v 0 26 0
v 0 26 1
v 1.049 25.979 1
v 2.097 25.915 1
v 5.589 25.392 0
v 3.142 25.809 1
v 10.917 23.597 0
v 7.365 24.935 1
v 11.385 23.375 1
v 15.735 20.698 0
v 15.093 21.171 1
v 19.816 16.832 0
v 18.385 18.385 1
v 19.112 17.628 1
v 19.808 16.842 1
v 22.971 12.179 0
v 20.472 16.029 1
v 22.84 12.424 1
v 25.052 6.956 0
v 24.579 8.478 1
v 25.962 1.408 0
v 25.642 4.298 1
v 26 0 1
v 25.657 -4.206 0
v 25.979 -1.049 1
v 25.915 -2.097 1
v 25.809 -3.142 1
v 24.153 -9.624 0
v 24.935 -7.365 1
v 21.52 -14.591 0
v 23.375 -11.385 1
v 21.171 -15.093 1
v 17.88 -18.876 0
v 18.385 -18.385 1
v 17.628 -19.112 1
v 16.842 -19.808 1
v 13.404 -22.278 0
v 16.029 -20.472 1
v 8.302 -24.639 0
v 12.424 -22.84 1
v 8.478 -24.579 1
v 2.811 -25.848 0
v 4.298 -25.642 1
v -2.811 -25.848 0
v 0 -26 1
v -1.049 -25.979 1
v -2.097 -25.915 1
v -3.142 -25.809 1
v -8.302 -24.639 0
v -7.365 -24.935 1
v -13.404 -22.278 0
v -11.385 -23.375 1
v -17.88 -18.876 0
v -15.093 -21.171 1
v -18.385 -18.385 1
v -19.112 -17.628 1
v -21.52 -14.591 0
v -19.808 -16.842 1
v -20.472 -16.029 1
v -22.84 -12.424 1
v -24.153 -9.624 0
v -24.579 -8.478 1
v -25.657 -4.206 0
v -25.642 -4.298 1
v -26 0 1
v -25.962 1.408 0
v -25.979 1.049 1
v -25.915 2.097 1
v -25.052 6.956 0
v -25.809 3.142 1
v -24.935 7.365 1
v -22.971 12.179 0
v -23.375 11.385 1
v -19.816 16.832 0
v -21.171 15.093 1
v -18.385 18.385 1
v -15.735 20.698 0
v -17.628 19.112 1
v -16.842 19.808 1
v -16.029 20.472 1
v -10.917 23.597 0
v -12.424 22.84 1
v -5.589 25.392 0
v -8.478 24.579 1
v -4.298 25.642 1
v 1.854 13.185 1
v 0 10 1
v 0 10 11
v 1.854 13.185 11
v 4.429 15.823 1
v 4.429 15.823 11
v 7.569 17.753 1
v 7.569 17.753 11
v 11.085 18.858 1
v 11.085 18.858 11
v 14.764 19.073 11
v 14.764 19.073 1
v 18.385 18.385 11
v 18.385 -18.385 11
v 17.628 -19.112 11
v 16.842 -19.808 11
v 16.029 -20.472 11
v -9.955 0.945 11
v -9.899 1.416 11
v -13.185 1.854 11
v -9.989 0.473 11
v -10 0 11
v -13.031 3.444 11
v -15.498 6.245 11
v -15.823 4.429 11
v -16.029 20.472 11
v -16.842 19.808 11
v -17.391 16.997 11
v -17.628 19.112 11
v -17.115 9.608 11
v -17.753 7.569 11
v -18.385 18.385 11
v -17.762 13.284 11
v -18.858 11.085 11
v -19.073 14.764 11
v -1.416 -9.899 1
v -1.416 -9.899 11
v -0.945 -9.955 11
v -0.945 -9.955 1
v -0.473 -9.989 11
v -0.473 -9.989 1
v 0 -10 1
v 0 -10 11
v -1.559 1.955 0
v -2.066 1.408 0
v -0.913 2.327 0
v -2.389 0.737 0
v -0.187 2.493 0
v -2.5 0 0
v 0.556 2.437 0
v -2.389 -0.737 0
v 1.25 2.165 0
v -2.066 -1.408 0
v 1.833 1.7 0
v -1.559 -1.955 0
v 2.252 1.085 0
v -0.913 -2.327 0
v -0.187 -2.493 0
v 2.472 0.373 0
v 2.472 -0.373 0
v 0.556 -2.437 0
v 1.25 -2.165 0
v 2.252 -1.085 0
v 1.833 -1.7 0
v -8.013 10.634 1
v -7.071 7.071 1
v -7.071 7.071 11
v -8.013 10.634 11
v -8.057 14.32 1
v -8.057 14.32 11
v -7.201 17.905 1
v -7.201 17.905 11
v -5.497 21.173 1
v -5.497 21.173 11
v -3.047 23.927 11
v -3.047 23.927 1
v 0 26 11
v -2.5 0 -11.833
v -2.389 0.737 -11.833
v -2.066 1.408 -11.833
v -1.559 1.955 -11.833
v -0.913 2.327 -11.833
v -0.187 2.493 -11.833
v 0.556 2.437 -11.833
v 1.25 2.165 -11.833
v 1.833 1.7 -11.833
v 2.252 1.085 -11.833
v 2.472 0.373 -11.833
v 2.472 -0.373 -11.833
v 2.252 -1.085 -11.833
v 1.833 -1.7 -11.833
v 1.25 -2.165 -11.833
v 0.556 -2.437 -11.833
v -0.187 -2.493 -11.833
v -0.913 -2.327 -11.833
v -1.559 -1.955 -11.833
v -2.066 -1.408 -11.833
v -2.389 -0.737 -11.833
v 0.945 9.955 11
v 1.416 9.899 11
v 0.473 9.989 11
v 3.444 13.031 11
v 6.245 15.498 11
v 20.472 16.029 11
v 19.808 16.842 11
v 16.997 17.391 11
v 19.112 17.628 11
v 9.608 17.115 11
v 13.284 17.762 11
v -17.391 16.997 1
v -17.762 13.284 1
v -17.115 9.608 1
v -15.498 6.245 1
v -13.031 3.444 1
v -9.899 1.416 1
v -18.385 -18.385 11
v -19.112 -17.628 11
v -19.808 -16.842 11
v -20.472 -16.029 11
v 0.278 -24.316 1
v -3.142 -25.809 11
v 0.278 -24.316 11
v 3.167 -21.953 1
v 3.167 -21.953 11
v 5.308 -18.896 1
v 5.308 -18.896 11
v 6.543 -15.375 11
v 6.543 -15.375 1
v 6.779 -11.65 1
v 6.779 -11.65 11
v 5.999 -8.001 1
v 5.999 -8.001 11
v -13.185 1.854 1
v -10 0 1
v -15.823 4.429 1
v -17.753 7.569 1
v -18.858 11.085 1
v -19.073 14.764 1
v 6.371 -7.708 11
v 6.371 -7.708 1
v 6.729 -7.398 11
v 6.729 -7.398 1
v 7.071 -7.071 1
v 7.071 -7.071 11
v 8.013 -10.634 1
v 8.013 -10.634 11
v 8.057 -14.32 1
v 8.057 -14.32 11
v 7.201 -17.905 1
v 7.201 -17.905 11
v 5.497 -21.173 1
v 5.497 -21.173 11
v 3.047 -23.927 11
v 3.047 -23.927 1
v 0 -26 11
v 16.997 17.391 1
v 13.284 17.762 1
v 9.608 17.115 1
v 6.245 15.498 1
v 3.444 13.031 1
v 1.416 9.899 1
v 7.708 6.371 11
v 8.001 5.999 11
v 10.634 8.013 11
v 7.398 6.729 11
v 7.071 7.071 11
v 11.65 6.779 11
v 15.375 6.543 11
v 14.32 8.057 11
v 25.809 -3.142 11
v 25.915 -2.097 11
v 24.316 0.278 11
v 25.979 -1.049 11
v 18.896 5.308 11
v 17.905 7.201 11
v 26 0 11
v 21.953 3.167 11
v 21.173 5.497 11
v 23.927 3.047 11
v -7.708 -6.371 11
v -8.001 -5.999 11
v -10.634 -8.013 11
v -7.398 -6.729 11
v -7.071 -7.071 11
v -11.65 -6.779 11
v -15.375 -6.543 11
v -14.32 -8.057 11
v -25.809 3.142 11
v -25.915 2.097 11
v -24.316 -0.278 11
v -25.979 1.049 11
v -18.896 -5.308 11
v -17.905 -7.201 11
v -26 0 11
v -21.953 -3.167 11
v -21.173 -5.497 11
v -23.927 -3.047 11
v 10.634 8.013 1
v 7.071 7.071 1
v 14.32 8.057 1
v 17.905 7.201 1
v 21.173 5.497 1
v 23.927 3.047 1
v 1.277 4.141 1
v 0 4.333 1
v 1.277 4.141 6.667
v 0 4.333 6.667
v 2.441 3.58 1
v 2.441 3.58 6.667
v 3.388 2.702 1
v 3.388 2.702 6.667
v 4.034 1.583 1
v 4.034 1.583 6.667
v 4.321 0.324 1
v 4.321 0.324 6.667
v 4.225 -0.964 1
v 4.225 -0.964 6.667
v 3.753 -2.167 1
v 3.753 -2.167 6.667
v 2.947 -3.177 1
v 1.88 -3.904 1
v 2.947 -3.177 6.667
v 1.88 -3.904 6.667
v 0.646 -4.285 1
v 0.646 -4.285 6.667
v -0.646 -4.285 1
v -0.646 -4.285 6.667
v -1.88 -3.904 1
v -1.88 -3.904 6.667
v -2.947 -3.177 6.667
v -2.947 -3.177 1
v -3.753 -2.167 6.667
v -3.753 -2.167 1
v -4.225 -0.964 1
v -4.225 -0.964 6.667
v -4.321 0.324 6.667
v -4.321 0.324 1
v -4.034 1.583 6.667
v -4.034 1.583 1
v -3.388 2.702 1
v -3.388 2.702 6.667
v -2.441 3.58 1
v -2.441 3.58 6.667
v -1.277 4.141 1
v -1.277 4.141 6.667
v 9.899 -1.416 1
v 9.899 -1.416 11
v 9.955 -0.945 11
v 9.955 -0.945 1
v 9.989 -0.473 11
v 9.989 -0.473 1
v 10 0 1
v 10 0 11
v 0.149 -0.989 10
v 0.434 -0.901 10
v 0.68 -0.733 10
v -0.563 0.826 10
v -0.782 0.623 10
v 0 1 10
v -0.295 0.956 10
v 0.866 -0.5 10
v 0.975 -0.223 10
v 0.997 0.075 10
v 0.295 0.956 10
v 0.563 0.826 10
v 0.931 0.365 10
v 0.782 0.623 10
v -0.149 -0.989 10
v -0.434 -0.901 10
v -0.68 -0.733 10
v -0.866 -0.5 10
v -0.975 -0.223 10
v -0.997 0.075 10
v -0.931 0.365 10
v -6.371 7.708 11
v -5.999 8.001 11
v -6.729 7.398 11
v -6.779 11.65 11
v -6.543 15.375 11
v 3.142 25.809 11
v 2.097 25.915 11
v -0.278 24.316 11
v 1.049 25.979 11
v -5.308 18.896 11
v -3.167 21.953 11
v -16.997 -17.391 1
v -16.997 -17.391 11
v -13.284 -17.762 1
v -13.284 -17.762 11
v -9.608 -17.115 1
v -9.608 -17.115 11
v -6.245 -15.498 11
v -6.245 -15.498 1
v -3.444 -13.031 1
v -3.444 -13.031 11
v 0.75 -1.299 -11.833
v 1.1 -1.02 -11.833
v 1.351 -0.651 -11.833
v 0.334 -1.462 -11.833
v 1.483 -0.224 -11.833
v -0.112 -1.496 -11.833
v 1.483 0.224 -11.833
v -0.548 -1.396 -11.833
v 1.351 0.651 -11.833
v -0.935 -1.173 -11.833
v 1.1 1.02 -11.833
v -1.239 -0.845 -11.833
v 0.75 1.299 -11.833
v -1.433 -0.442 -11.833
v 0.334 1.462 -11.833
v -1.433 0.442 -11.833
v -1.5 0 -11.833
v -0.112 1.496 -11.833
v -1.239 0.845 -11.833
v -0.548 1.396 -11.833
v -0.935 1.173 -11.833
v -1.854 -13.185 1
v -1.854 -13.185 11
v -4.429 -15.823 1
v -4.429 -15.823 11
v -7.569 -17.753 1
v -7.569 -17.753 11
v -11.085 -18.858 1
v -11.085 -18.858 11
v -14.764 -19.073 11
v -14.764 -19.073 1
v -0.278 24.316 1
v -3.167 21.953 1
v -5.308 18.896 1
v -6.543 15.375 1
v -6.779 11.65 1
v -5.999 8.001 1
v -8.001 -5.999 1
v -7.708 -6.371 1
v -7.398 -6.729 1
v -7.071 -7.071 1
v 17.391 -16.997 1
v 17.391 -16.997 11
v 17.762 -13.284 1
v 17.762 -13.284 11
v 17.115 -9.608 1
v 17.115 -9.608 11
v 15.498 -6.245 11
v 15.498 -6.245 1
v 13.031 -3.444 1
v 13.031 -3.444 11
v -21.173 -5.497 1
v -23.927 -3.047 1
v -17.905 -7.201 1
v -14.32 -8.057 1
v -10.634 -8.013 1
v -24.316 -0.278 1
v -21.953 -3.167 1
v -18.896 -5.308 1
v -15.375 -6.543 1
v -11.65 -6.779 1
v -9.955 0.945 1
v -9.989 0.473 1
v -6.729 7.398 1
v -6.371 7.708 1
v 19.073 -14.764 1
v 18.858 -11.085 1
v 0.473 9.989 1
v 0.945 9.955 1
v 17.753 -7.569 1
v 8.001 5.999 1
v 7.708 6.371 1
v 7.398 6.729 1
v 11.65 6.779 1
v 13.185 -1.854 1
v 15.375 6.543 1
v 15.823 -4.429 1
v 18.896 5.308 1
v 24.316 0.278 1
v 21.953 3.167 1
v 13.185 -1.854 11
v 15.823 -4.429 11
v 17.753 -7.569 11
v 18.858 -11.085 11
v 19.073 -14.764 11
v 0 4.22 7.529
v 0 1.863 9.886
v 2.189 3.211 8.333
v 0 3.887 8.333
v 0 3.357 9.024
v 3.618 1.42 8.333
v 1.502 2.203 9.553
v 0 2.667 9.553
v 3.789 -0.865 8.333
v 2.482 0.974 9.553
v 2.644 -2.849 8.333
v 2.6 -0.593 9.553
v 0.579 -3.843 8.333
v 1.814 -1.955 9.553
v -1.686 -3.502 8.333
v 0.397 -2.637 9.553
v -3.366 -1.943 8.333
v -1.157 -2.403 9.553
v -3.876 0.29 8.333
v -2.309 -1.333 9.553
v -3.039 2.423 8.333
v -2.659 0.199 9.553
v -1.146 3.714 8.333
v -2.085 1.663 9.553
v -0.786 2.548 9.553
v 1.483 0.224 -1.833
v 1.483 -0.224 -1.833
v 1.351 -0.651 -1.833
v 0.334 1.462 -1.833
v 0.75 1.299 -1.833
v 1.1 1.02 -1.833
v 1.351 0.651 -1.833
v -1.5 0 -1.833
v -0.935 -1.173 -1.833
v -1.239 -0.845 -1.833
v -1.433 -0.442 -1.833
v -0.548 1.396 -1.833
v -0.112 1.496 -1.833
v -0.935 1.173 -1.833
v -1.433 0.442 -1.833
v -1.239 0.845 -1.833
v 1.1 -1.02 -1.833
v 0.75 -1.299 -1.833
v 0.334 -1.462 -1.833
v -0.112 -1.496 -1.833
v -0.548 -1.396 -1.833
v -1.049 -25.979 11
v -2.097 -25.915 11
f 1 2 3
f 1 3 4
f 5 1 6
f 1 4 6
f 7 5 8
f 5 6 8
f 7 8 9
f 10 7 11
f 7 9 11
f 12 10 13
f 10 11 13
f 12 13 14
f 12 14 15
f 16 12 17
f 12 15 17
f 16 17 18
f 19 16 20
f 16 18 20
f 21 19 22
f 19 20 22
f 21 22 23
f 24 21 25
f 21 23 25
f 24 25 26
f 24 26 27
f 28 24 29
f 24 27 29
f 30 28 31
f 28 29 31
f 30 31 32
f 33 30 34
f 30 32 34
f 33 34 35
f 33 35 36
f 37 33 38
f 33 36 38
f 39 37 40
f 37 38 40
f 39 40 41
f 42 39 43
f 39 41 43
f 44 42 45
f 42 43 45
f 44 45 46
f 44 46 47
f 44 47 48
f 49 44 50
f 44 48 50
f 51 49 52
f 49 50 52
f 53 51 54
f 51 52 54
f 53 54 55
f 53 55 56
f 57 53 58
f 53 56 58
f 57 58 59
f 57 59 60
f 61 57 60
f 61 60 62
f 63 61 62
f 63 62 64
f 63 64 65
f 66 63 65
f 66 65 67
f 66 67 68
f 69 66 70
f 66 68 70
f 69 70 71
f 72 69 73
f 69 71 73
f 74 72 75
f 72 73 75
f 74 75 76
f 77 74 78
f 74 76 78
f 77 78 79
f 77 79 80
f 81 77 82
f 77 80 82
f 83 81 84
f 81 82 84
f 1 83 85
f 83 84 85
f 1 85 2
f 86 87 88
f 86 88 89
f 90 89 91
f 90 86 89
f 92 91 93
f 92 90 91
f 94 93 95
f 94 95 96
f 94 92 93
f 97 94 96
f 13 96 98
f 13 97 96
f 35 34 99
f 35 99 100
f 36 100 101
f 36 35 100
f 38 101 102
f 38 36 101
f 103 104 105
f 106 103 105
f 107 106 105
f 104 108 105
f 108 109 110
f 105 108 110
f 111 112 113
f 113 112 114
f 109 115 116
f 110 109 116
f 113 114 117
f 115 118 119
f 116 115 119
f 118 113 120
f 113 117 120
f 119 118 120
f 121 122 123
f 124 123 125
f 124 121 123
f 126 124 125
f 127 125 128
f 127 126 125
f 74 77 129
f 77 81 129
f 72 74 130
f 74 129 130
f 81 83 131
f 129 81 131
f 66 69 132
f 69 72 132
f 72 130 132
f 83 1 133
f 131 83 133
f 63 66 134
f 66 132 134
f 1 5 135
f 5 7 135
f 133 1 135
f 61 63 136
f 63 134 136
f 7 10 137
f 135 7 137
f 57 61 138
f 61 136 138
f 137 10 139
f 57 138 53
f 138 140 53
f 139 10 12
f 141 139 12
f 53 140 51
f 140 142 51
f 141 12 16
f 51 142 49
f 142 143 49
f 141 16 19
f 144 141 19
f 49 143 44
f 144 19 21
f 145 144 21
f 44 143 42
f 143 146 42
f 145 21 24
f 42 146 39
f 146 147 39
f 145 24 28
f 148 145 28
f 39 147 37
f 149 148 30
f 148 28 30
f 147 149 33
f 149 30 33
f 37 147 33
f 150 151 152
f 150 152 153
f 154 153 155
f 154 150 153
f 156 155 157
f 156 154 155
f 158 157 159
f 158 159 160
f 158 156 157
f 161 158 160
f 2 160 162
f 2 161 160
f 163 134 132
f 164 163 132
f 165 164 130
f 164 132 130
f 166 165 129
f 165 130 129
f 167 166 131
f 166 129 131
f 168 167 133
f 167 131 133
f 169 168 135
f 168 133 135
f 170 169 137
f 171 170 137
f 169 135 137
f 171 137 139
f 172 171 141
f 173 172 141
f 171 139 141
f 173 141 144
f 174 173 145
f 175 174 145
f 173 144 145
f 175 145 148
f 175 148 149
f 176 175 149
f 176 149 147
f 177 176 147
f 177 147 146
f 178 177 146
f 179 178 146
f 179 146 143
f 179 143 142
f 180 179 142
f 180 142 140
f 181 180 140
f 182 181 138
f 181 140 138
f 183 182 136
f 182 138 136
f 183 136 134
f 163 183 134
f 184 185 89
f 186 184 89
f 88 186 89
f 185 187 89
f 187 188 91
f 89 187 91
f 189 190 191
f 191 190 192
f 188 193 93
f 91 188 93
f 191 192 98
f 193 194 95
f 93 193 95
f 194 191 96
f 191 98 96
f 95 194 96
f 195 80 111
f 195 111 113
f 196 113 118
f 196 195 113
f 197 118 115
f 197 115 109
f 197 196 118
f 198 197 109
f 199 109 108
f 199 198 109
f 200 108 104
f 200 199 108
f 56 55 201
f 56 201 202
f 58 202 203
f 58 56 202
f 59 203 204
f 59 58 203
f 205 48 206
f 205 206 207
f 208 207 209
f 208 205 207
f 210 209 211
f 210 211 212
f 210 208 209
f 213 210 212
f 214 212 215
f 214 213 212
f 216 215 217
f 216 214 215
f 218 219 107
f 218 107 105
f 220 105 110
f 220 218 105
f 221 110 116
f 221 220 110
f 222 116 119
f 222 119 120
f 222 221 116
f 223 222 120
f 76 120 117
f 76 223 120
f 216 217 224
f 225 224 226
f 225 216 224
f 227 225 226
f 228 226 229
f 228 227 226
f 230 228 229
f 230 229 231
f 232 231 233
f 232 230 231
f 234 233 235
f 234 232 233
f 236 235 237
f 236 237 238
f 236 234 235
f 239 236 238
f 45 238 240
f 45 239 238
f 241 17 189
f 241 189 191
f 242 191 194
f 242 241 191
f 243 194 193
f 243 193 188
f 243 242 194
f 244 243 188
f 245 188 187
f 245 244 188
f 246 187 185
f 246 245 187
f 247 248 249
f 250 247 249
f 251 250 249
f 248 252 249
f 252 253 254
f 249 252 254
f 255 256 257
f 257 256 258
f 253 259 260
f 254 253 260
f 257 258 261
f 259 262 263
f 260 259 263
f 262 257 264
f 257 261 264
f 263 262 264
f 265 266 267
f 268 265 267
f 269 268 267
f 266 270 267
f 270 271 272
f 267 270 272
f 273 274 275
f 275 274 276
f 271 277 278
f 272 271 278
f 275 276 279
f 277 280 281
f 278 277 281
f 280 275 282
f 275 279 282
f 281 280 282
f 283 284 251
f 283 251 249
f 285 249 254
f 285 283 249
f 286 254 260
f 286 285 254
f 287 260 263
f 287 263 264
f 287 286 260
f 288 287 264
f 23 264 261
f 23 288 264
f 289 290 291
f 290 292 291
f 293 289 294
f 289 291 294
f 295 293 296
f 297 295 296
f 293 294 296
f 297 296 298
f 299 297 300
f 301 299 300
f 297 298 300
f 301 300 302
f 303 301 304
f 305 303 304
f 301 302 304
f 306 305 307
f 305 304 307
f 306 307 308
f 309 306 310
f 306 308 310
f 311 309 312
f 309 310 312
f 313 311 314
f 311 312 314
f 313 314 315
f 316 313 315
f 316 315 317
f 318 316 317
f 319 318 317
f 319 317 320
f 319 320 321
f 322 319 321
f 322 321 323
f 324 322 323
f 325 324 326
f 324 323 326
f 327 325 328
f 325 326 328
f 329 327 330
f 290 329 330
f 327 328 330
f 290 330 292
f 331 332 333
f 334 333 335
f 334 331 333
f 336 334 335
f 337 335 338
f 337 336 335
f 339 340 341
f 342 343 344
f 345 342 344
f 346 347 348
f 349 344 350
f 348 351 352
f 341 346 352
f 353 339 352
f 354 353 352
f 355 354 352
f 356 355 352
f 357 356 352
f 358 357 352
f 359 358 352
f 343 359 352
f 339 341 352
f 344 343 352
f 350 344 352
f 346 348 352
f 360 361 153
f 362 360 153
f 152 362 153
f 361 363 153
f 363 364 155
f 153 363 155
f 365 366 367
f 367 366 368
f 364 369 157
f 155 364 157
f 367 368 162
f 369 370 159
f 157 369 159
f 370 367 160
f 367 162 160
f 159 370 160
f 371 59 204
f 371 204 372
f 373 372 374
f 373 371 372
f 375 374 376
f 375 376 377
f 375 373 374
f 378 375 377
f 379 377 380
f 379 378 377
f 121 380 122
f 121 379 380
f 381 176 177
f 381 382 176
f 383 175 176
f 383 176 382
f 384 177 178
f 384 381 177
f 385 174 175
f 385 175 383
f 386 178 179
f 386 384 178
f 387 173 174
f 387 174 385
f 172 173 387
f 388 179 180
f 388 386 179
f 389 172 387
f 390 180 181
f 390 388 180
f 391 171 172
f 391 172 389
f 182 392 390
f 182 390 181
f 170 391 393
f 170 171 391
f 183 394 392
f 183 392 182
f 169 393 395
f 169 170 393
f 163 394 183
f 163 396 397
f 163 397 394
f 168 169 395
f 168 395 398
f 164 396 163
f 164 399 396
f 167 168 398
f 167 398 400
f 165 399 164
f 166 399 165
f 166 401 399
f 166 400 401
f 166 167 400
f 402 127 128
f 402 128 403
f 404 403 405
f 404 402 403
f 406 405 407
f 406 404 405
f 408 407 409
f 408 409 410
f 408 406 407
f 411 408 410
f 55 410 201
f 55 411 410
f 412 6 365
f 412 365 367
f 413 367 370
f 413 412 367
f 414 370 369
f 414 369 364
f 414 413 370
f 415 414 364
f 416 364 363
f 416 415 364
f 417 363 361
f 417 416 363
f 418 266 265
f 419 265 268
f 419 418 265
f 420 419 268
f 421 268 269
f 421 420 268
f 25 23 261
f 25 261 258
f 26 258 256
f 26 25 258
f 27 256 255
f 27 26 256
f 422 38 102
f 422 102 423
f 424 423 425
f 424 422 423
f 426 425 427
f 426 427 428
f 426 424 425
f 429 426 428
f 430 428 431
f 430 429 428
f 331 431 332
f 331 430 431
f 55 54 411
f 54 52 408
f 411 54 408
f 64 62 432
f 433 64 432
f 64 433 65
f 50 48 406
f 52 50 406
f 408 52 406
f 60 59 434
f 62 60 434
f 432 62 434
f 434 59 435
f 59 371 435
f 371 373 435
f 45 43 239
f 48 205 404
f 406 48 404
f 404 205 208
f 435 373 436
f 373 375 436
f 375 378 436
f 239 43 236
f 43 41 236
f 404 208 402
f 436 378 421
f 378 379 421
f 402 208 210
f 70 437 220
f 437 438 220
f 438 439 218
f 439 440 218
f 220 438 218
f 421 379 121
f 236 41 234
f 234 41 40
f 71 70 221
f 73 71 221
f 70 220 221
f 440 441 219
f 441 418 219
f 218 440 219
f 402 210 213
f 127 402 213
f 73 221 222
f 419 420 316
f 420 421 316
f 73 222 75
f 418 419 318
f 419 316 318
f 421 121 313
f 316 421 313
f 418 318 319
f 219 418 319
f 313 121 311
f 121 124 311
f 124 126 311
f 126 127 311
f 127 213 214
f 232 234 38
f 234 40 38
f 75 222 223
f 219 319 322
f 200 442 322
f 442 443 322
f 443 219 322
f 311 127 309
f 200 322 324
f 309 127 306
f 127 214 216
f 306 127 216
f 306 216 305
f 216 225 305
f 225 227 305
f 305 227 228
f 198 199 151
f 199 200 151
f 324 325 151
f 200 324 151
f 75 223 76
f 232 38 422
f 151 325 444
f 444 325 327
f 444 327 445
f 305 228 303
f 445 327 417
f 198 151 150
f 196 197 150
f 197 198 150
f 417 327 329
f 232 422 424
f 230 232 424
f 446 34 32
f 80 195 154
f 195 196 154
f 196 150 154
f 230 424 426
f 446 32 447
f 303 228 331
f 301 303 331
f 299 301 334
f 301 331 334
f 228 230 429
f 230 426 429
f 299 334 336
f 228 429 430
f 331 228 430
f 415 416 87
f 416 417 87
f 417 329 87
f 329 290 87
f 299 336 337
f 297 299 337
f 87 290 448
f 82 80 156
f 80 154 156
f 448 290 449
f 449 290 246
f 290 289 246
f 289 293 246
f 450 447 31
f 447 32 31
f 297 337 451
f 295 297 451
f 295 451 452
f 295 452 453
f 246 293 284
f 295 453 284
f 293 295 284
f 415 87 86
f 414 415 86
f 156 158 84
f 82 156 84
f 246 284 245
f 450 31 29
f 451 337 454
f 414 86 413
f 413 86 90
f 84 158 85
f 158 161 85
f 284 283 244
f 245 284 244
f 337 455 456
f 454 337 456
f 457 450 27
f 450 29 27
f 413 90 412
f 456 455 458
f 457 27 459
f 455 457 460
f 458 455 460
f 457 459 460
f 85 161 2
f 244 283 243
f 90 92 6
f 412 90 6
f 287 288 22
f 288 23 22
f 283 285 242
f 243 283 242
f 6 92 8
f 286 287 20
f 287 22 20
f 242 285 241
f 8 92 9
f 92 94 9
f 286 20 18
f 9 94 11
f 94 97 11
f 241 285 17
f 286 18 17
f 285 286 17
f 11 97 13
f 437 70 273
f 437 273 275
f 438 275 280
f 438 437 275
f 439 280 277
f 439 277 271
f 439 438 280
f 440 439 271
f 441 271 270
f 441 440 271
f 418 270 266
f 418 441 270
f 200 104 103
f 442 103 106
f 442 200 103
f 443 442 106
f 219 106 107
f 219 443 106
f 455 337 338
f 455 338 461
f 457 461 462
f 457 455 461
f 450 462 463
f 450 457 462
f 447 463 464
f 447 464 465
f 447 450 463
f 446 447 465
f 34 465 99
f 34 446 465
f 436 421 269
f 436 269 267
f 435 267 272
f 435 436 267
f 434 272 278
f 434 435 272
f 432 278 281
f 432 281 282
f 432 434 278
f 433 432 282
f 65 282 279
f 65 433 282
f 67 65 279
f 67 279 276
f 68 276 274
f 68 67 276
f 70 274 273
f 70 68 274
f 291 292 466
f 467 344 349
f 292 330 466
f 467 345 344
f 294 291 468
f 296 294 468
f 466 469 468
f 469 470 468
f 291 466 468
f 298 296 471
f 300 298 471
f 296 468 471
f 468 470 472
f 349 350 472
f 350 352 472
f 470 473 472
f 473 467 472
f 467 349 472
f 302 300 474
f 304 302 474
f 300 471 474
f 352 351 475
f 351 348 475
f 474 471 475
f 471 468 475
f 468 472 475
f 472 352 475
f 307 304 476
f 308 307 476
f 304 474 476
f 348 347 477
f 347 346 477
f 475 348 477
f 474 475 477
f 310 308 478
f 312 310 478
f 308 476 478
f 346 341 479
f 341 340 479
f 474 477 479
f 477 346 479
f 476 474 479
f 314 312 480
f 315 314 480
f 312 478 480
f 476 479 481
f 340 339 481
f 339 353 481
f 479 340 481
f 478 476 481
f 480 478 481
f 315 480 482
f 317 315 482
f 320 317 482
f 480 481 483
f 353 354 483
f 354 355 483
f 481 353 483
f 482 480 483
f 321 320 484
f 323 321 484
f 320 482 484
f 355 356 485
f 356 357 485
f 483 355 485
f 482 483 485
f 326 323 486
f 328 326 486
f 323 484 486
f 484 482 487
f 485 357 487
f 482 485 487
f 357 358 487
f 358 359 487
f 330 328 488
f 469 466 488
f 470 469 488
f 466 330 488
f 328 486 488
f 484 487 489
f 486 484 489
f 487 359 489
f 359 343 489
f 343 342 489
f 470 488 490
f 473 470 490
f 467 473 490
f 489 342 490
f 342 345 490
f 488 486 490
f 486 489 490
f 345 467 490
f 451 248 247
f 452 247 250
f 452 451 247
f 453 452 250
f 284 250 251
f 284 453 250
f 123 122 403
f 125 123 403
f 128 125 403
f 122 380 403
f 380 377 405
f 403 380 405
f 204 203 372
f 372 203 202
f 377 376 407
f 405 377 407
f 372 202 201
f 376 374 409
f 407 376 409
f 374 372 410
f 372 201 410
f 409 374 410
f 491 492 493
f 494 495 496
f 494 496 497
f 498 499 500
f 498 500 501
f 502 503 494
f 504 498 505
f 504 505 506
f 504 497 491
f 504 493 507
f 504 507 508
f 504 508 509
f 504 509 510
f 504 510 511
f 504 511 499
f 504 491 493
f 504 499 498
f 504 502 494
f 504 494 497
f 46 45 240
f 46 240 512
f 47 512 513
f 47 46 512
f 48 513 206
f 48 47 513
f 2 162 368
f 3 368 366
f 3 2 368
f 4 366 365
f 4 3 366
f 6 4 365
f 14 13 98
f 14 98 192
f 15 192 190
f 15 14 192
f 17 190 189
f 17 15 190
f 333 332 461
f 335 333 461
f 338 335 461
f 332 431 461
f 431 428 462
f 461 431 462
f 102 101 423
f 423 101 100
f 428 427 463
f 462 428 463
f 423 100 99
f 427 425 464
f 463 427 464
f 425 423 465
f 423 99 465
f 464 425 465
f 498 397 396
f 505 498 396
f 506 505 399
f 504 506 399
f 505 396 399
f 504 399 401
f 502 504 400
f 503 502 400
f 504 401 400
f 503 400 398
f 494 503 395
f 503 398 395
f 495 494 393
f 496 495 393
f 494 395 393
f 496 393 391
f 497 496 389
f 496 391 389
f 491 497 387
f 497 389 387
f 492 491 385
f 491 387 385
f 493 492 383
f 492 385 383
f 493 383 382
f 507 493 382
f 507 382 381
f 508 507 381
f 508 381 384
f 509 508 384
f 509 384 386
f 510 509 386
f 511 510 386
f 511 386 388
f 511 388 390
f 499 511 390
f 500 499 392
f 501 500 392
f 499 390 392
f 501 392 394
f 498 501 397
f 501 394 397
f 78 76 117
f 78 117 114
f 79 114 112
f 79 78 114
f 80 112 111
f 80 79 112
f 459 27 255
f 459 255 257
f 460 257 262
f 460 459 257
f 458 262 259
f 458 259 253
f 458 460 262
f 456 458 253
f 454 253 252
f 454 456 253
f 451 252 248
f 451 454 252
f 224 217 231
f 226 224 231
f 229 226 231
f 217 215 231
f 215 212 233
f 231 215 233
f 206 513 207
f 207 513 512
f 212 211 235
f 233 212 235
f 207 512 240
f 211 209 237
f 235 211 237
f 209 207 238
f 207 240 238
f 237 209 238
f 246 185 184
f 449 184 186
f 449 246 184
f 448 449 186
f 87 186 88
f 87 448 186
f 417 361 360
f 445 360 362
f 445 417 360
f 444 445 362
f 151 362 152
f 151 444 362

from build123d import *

# Parameters (mm, degrees)
BOSS_EXTRUDE1_DEPTH = 10
CIRPATTERN1_COUNT   = 8
SKETCH4_R           = 2.5
BOSS_EXTRUDE2_DEPTH = 11.83333333
SKETCH5_R           = 1.5
CUT_EXTRUDE1_DEPTH  = 10


with BuildPart() as part:
    # Sketch1 → Revolve2 (revolve)
    with BuildSketch(Plane(origin=(0, 0, 0), x_dir=(0, 0, -1), z_dir=(1, 0, 0))):
        with BuildLine():
            Line((0, 0), (0, 26))
            Line((0, 26), (-1, 26))
            Line((-1, 26), (-1, 4.333333333))
            Line((-1, 4.333333333), (-6.666666667, 4.333333333))
            ThreePointArc((-6.666666667, 4.333333333), (-9.023689271, 3.357022604), (-10, 1))
            Line((-10, 1), (-10, 0))
            Line((-10, 0), (0, 0))
        make_face()
    revolve(axis=Axis((0, 0, 10), (0, 0, -1)))

    # Sketch3 → Boss-Extrude1 (add)
    with BuildSketch(Plane.XY.offset(1)):
        with BuildLine():
            ThreePointArc((-5.998935548, 8.000798228), (-6.551514834, 7.554975406), (-7.071067812, 7.071067812))
            ThreePointArc((-7.071067812, 7.071067812), (-7.201026268, 17.904810567), (0, 26))
            ThreePointArc((0, 26), (1.573713281, 25.952329886), (3.141655863, 25.809494347))
            ThreePointArc((3.141655863, 25.809494347), (-5.308082056, 18.896330591), (-5.998935548, 8.000798228))
        make_face()
    boss_extrude1 = extrude(amount=BOSS_EXTRUDE1_DEPTH)

    # CirPattern1: Boss-Extrude1 ×8 about axis
    cirpattern1_axis = Axis((0, 0, 0), (0, 0, 1))
    for i in range(1, CIRPATTERN1_COUNT):
        add(boss_extrude1.rotate(cirpattern1_axis, i * 360 / CIRPATTERN1_COUNT))

    # Sketch4 → Boss-Extrude2 (add)
    with BuildSketch(Plane(origin=(0, 0, 0), x_dir=(-1, 0, 0), z_dir=(0, 0, -1))):
        Circle(SKETCH4_R)
    extrude(amount=BOSS_EXTRUDE2_DEPTH)

    # Sketch5 → Cut-Extrude1 (cut)
    with BuildSketch(Plane(origin=(0, 0, -11.83333333), x_dir=(-1, 0, 0), z_dir=(0, 0, -1))):
        Circle(SKETCH5_R)
    extrude(amount=-CUT_EXTRUDE1_DEPTH, mode=Mode.SUBTRACT)


solid = part.part
